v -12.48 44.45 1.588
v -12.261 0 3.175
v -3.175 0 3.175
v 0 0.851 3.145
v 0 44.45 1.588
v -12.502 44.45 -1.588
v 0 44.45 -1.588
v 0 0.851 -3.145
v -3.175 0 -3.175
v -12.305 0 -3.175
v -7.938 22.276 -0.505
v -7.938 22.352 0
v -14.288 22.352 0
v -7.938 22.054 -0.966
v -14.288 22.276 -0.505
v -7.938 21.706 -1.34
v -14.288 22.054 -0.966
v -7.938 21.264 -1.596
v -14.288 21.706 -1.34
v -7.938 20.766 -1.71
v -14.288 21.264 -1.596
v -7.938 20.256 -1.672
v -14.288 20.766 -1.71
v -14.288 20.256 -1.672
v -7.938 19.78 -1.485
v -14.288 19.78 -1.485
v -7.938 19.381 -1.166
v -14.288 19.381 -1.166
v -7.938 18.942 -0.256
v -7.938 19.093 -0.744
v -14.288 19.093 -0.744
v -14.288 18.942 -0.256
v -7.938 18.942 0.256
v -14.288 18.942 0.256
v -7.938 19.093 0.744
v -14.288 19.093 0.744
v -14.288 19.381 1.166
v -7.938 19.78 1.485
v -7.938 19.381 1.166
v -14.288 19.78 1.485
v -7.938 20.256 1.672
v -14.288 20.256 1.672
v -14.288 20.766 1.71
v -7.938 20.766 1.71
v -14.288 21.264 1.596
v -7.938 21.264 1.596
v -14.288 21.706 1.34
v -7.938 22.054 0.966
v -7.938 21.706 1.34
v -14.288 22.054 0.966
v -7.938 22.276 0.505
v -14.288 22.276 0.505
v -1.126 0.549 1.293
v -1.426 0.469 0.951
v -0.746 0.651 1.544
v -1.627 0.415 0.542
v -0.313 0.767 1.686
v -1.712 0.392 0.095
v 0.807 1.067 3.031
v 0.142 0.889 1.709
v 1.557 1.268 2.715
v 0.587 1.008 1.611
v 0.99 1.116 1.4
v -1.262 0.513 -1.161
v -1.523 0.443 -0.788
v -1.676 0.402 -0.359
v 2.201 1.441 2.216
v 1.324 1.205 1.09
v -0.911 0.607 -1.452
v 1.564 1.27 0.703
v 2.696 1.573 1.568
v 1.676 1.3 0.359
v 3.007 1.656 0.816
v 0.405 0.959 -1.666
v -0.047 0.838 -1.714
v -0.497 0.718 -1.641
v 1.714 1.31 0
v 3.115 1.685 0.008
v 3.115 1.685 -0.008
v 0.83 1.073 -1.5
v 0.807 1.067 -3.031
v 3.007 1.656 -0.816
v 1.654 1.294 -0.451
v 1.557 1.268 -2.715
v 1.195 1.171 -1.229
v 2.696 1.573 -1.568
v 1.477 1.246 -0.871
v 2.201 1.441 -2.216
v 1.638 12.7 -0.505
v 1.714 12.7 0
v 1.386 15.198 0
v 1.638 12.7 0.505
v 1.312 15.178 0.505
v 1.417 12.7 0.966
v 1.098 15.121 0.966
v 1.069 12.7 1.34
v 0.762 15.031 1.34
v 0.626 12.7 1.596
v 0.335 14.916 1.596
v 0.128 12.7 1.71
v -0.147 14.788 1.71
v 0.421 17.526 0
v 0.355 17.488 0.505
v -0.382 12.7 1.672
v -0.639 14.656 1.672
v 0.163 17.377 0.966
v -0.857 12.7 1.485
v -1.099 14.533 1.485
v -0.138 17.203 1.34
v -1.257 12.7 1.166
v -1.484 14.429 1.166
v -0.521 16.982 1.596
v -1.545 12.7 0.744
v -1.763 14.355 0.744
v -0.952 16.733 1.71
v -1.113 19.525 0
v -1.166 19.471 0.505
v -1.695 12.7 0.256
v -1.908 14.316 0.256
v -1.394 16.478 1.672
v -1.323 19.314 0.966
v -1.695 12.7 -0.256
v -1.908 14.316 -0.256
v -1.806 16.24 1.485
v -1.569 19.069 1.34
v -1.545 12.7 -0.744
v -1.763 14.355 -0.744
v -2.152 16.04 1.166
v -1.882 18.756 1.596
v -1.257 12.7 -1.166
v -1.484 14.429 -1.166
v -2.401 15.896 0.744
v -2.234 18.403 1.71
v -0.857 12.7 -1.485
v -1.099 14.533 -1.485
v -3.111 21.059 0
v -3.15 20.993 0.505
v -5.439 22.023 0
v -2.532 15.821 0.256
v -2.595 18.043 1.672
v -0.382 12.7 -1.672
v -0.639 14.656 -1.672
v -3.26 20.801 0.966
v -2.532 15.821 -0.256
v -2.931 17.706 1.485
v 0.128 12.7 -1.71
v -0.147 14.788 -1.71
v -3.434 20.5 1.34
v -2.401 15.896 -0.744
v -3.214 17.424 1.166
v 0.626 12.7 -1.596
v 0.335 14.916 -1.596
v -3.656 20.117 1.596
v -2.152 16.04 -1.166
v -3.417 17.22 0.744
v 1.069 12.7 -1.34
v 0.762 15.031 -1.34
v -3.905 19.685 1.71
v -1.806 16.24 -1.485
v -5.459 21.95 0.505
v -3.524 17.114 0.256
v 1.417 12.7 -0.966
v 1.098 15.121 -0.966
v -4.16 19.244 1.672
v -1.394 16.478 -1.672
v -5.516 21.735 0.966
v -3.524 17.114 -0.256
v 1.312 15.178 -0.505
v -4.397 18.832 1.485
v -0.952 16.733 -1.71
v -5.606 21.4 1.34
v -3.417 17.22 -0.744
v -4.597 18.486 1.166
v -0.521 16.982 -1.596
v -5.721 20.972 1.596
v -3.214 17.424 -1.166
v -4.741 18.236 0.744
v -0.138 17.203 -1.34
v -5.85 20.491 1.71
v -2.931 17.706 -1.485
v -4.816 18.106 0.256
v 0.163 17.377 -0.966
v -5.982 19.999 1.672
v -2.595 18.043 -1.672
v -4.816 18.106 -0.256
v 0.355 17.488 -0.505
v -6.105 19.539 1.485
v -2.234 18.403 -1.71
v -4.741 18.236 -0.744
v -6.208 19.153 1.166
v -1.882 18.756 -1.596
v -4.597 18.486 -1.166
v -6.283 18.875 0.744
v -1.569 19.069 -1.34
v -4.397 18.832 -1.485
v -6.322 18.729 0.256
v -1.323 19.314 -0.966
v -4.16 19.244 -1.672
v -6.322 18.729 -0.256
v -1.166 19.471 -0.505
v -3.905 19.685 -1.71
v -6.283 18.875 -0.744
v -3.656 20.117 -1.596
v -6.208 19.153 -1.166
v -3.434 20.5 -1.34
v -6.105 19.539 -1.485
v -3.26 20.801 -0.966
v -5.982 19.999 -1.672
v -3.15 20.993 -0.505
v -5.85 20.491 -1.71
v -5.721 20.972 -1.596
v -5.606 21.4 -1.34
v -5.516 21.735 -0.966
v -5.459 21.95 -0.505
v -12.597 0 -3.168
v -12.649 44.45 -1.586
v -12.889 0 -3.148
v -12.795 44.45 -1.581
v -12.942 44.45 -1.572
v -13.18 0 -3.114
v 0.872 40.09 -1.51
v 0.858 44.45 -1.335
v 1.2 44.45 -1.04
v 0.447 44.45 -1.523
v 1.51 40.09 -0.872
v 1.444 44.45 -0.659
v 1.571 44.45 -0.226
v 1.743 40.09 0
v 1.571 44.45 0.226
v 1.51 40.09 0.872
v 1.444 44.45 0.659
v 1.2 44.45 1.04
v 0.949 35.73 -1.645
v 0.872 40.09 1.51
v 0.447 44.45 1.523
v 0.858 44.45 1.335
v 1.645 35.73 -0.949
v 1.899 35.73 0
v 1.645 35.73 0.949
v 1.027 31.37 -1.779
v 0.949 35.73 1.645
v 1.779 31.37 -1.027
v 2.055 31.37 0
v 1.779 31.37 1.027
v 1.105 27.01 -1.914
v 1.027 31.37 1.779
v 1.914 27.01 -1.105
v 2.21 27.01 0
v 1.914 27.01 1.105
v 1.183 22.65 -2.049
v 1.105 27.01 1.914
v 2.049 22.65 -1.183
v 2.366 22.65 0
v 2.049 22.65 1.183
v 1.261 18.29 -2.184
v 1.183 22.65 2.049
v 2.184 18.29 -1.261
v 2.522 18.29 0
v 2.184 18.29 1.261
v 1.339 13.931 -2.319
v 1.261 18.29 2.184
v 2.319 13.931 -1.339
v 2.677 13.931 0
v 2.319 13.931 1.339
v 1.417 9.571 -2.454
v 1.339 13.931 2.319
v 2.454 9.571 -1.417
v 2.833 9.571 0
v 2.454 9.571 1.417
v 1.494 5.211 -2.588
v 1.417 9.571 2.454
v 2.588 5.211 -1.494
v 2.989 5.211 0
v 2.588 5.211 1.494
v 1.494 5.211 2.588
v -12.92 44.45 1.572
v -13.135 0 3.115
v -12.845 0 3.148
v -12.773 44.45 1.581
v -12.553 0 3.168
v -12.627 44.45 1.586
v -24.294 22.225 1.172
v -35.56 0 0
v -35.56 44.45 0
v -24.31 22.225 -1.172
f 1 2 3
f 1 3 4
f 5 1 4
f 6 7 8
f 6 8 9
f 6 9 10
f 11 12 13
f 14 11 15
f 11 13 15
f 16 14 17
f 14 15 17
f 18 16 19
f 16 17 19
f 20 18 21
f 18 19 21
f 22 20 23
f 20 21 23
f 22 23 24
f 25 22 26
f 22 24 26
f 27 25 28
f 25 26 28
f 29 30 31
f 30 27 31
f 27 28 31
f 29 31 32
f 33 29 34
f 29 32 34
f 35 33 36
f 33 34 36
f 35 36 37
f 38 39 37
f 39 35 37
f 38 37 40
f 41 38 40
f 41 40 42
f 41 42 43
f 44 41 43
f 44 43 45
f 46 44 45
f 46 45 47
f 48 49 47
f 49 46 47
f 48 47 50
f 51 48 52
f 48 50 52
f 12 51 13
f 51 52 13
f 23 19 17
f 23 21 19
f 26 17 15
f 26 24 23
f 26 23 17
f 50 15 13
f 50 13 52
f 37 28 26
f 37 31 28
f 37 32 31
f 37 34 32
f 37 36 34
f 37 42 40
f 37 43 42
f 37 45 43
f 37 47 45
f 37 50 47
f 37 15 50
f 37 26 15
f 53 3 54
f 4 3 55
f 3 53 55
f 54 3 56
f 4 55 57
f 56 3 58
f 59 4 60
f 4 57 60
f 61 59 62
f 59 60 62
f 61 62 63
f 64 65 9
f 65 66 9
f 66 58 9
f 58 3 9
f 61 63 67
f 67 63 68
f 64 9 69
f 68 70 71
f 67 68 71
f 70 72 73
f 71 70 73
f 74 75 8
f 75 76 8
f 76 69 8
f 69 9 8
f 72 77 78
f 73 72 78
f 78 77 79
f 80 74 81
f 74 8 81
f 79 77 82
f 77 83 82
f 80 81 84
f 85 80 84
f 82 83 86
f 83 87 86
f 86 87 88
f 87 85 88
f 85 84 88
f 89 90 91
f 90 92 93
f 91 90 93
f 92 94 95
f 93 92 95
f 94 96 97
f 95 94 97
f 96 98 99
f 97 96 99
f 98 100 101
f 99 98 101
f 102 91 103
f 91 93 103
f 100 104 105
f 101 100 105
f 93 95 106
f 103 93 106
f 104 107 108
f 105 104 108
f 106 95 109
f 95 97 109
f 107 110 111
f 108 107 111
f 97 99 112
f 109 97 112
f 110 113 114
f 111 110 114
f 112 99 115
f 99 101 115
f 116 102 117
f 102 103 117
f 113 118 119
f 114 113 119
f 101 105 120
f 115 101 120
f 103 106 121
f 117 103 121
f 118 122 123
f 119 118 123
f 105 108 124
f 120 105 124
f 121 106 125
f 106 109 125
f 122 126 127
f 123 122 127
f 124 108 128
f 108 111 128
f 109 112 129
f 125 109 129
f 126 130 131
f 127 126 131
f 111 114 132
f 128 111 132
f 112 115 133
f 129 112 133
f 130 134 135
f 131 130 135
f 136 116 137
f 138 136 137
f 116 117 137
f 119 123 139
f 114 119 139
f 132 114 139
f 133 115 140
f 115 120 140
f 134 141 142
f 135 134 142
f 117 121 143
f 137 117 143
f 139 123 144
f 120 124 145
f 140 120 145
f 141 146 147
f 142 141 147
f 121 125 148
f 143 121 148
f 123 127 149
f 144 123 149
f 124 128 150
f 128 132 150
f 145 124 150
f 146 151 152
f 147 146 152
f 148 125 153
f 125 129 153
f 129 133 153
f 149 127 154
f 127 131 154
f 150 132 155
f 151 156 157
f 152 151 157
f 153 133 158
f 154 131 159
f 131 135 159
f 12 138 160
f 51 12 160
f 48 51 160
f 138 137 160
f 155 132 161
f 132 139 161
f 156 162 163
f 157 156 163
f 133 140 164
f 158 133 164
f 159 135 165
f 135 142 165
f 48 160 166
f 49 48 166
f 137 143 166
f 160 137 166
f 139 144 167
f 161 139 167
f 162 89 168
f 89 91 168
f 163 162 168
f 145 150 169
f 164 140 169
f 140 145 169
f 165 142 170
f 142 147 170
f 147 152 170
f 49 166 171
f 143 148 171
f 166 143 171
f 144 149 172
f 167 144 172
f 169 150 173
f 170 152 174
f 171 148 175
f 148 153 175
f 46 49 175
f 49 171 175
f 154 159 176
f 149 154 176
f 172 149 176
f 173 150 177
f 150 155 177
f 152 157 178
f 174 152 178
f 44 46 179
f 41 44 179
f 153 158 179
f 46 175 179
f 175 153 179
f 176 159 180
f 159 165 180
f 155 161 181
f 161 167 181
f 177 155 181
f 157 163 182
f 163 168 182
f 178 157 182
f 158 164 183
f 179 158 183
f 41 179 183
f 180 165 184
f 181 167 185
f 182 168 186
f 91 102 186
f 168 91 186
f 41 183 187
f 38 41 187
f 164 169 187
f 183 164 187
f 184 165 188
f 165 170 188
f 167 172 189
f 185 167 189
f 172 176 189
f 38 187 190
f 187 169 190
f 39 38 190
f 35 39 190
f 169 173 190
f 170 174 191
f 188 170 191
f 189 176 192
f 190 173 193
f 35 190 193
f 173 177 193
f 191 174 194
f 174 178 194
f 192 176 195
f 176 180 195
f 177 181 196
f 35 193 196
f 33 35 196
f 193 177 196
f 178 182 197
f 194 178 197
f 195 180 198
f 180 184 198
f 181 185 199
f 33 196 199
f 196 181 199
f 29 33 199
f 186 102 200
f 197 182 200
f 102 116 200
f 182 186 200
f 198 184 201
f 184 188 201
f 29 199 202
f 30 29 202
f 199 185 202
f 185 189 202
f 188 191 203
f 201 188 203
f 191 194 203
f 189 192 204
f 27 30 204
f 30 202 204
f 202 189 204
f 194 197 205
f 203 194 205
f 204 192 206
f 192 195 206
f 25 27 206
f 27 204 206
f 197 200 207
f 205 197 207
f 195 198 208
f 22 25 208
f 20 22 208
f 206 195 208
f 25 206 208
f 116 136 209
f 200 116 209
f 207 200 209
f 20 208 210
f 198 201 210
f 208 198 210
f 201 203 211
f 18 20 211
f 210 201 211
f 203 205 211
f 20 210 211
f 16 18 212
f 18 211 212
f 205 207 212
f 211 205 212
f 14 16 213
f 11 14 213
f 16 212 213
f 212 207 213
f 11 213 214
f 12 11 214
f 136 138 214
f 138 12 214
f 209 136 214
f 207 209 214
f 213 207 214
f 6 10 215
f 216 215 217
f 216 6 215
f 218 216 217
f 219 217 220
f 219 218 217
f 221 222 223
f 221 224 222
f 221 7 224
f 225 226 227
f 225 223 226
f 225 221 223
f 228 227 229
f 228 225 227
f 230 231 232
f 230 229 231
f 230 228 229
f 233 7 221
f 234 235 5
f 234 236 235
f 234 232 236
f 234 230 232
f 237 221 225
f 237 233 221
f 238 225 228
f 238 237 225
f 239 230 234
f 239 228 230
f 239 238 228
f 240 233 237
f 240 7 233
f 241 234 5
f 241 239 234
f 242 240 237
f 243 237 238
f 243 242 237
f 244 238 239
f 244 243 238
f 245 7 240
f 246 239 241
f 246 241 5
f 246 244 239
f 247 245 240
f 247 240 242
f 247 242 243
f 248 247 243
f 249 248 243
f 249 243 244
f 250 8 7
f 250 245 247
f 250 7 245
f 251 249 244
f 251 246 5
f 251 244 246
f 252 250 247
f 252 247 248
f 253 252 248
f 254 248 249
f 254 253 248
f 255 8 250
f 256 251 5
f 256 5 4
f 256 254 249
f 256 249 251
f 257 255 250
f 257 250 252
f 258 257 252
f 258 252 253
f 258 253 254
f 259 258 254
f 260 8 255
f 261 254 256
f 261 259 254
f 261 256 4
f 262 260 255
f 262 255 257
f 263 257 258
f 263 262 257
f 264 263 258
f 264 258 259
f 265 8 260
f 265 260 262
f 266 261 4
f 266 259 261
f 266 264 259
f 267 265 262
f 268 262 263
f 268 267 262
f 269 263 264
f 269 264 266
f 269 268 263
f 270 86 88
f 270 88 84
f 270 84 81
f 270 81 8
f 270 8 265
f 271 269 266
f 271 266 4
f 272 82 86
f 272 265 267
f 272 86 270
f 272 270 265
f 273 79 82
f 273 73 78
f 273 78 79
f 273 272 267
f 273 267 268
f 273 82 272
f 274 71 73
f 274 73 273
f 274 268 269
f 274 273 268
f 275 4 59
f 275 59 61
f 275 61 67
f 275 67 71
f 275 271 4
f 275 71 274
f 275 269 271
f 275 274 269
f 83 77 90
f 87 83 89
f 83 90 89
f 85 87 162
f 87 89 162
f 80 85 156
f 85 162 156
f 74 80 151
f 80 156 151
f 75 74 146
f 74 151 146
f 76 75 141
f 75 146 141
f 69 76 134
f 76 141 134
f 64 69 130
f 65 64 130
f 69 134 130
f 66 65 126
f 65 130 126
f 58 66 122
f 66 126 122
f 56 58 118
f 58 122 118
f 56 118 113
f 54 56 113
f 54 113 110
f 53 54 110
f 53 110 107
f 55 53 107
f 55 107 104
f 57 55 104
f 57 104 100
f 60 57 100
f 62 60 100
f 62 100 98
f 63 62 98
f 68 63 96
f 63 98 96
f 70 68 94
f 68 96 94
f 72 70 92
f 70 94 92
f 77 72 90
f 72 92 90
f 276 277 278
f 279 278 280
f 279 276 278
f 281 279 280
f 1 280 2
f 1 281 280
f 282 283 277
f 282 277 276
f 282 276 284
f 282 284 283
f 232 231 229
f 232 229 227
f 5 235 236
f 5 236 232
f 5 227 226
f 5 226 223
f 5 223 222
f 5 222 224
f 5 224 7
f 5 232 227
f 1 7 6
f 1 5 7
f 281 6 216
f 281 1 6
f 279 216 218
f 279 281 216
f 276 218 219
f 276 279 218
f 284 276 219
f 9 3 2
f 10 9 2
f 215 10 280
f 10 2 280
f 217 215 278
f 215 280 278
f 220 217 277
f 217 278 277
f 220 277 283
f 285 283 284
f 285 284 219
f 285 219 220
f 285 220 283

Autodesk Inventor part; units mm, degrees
ref_plane "YZ Plane" through (0, 0, 0) normal (1, 0, 0) x (0, 1, 0)
ref_plane "XY Plane" through (0, 0, 0) normal (0, 0, 1) x (1, 0, 0)
sketch "Sketch2" plane through (0, 0, 0) normal (0, 1, 0) x (-1, 0, 0)
  circle A0 centre (0, 0) radius 3.175
  line L0 (0, 0) -> (35.56, 0)
  line L1 (0, 3.175) -> (12.2611, 3.175)
  line L2 (0, -3.175) -> (12.3047, -3.175)
  line L3 (13.1799, -3.1144) -> (35.56, 0)
  line L4 (35.56, 0) -> (13.1347, 3.1146)
  arc A1 (13.1347, 3.1146) -> (12.2611, 3.175) centre (12.2611, -3.175) ccw
  arc A2 (12.3047, -3.175) -> (13.1799, -3.1144) centre (12.3047, 3.175) ccw
  circle A3 centre (0, 0) radius 1.5875
  point P0 (12.7, 3.175)
  dimension "d5" = 6.35
  dimension "d6" = 35.56
  dimension "d7" = 12.7
  dimension "d8" = 6.35
  dimension "d9" = 6.35
  dimension "d12" = 3.175
ref_plane "Work Plane1" through (0, 44.45, 0) normal (0, 1, 0) x (-1, 0, 0)
sketch "Sketch3" plane through (0, 44.45, 0) normal (0, 1, 0) x (-1, 0, 0)
  circle A0 centre (0, 0) radius 1.5875
  line L0 (0, 1.5875) -> (12.4798, 1.5875)
  line L1 (0, -1.5875) -> (12.5018, -1.5875)
  line L2 (12.9421, -1.5722) -> (35.56, 0)
  line L3 (35.56, 0) -> (12.9197, 1.5722)
  arc A1 (12.9197, 1.5722) -> (12.4798, 1.5875) centre (12.4798, -4.7625) ccw
  arc A2 (12.5018, -1.5875) -> (12.9421, -1.5722) centre (12.5018, 4.7625) ccw
  point P0 (12.7, 1.5875)
  dimension "d14" = 3.175
  dimension "d15" = 12.7
  dimension "d16" = 6.35
  dimension "d17" = 6.35
loft "Loft1" add profiles "Sketch2", "Sketch3" contours A0 | L0 L3 A2 L2 A0 | A0 L1 A1 L4 L0 | A3 / all
sketch "Sketch4" plane through (0, 0, 0) normal (0, 0, 1) x (1, 0, 0)
  line L0 (-12.2611, 0) -> (0, 0) projected
  line L1 (0, 0) -> (0, 12.7)
  line L2 (0, 0) -> (0, 44.45) projected
  line L3 (0, 12.7) -> (-7.9375, 12.7)
  line L4 (-7.9375, 12.7) -> (-7.9375, 20.6375)
  arc A0 (0, 12.7) -> (-7.9375, 20.6375) centre (-7.9375, 12.7) ccw
  line L5 (-7.9375, 20.6375) -> (-14.2875, 20.6375)
  dimension "d22" = 12.7
  dimension "d23" = 7.9375
  dimension "d24" = 7.9375
  dimension "d25" = 6.35
sketch "Sketch5" plane through (-12.3047, 0, -3.175) normal (0, -1, 0) x (1, 0, 0)
  circle A0 centre (12.3047, 3.175) radius 1.7145
  dimension "d26" = 3.429
sweep "Sweep1" cut profiles "Sketch5" path "Sketch4" path curves L1 A0 L5
sketch "Sketch6" plane through (0, 0, 0) normal (0, 0, 1) x (1, 0, 0)
  line L0 (3.175, 0) -> (0, 0) projected
  line L1 (3.175, 0) -> (-3.175, 0)
  line L2 (0, 0) -> (-12.3047, 0) projected
  line L3 (-3.175, 0) -> (3.1148, 1.6853)
  line L4 (3.175, 0) -> (1.5875, 44.45) projected
  dimension "d29" = 6.35
  dimension "d30" = 15
extrude "Extrusion3" cut sketch "Sketch6" along normal mid plane 25.4
properties part number "RudderUpperControlSurface"
